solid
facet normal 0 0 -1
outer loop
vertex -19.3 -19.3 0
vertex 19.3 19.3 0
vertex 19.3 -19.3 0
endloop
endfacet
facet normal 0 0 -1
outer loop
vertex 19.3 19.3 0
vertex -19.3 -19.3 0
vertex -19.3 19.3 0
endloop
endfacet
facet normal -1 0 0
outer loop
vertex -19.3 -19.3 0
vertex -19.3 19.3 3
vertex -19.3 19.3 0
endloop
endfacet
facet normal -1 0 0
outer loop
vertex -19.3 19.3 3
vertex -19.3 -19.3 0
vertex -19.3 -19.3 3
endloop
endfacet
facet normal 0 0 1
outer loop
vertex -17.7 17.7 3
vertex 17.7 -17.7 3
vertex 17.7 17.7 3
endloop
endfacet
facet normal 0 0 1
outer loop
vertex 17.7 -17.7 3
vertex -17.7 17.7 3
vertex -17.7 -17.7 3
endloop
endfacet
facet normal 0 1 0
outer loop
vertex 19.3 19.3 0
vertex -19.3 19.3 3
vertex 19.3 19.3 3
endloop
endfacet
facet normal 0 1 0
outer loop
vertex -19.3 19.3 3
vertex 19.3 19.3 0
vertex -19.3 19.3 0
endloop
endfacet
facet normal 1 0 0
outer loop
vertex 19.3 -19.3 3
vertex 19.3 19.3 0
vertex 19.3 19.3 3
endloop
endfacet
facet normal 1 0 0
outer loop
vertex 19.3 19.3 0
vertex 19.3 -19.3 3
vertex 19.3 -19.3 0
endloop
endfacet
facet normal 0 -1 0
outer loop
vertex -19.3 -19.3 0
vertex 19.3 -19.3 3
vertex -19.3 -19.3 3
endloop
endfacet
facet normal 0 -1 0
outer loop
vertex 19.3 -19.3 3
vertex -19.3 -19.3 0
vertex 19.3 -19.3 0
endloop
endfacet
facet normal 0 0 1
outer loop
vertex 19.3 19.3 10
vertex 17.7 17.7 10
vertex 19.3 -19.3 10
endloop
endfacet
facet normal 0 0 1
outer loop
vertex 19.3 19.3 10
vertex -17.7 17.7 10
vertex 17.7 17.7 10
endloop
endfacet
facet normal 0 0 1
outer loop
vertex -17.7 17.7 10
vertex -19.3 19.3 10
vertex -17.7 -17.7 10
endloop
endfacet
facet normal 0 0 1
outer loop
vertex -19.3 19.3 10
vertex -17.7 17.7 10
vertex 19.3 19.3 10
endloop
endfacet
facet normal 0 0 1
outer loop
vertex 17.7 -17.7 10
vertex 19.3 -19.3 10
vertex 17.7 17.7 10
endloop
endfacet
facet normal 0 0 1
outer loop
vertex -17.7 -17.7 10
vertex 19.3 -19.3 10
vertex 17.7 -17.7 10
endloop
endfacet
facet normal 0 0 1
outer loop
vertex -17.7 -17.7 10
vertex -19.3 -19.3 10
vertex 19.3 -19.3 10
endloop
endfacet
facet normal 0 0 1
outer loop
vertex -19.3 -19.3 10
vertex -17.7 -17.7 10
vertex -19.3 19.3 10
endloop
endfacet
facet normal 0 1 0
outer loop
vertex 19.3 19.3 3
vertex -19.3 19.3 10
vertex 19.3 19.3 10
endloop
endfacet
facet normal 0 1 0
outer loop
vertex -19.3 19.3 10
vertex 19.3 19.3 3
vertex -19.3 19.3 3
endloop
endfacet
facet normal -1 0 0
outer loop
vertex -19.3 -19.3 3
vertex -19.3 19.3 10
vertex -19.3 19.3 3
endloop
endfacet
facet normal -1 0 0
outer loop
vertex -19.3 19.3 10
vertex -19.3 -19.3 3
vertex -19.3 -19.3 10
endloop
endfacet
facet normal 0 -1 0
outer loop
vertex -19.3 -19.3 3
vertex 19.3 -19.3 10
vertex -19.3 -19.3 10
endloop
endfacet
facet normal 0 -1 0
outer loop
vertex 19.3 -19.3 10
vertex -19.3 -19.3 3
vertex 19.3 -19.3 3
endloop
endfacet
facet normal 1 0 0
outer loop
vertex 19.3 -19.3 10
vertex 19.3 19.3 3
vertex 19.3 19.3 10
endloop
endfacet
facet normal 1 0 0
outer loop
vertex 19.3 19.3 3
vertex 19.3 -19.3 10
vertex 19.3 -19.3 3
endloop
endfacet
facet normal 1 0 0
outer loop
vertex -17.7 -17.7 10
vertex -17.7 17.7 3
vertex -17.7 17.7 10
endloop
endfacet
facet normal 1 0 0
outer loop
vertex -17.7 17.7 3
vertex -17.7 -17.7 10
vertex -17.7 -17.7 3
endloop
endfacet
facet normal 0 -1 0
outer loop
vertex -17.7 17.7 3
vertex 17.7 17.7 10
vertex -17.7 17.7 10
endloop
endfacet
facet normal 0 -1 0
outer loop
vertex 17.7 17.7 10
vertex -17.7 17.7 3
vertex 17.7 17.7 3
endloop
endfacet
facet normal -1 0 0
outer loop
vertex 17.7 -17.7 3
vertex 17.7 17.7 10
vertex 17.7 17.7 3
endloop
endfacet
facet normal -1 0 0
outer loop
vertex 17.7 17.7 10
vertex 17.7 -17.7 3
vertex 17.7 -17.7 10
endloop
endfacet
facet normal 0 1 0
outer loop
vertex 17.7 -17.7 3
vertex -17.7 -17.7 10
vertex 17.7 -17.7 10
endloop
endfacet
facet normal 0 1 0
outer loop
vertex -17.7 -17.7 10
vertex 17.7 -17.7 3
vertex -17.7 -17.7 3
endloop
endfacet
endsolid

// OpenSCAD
// file: ../diffuser.scad
// Swappable diffuser panel. Thickness is the STL knob; the diffusing structure
// (gyroid/grid, density, top/bottom solid layers = 0) is set in the slicer.

module diffuser_panel(t) {
    linear_extrude(t) square([panel_side, panel_side], center = true);
}

// Slide-over diffuser CAP: a diffuser top + a skirt that slides over the OUTSIDE
// of a chimney. Easy on/off, and one cap fits any chimney (same outer size).
// Modeled diffuser-face-down (z=0..t) = print orientation (smooth side on bed);
// flip it in use so the smooth face points at the viewer and the skirt hangs down.
module diffuser_cap(t) {
    si = cell_pitch + cap_fit_clear;      // skirt inner — slides over the chimney outer
    so = si + 2 * cap_skirt_t;            // skirt outer
    union() {
        linear_extrude(t) square([so, so], center = true);          // diffuser face
        translate([0, 0, t])
            linear_extrude(cap_skirt_h)                             // skirt
                difference() {
                    square([so, so], center = true);
                    square([si, si], center = true);
                }
    }
}
// file: ../config.scad
// ===== CHARGE LED sign — global config =====
// Edit this file; then run ./build.sh to regenerate every STL.

$fn = 72;

// ---- calibrated collar (press-fit for 12mm bullet pixel) ----
collar_stl    = "../../assets/bullet-collar.stl"; // path resolved from src/parts/ entry files
collar_h      = 2.0;     // Z span of the collar STL
collar_od     = 16.0;    // collar outer diameter
collar_cx     = 43.0;    // STL native X center (Y center is 0)
pixel_through = 12.3;    // clearance hole through the plate (just over bore Ø12.19)
dome_clear    = 4.0;     // dome protrusion above plate front. Spec: 5.5mm dome-tip-to-flange,
                         // flange seats on plate back, minus 2mm plate ~= 3.5-4mm. Seat a real
                         // pixel and measure to lock it in.

// ---- shell ----
plate_t    = 2.0;        // rear plate thickness (== collar_h, so the collar sits flush)
wall_t     = 2.5;        // chimney wall thickness
cell_inner = 30;         // square interior of each test cell (the press-fit opening)

// ---- diffuser panels (flat, drop-in — kept for the final glued option) ----
panel_press_clear = 0.25; // panel is this much SMALLER than the opening (total) -> friction fit
panel_thicks      = [1, 2, 3];

// ---- diffuser CAP (slides over the chimney; easy-swap for testing) ----
cap_fit_clear = 0.4;   // skirt-inner minus chimney-outer (total); bigger = looser slide
cap_skirt_t   = 1.6;   // skirt wall thickness
cap_skirt_h   = 7;     // how far the skirt grips down over the chimney

// ---- coupon depth ladder ----
led_gaps = [20, 35, 50]; // clear LED-tip -> panel distance, per cell (mm)

// ---- collar v2: original bore + lip, plus a 45-deg lead-in chamfer ----
bore_face_r   = 6.10;    // collar bore radius at each face (~Ø12.2)
chamfer_depth = 0.5;     // axial depth of the 45-deg lead-in at each face
mouth_r       = bore_face_r + chamfer_depth;  // chamfer mouth radius (~Ø13.2)

// ---- collar A/B test harness ----
harness_w     = 52;      // tile width
harness_d     = 30;      // tile depth
harness_t     = plate_t; // match the real wall thickness for a faithful fit test
harness_pitch = 24;      // spacing between the two hole centers

// ---- derived ----
cell_pitch = cell_inner + 2 * wall_t;      // outer cell footprint (35)
n_cells    = len(led_gaps);
plate_w    = n_cells * cell_pitch;
plate_d    = cell_pitch;
panel_side = cell_inner - panel_press_clear;
function cell_x(i)     = i * cell_pitch + cell_pitch / 2;
function chimney_H(i)  = plate_t + dome_clear + led_gaps[i];
// main file
// Build target: 3mm slide-over diffuser cap.
include <../config.scad>
include <../diffuser.scad>
diffuser_cap(3);
